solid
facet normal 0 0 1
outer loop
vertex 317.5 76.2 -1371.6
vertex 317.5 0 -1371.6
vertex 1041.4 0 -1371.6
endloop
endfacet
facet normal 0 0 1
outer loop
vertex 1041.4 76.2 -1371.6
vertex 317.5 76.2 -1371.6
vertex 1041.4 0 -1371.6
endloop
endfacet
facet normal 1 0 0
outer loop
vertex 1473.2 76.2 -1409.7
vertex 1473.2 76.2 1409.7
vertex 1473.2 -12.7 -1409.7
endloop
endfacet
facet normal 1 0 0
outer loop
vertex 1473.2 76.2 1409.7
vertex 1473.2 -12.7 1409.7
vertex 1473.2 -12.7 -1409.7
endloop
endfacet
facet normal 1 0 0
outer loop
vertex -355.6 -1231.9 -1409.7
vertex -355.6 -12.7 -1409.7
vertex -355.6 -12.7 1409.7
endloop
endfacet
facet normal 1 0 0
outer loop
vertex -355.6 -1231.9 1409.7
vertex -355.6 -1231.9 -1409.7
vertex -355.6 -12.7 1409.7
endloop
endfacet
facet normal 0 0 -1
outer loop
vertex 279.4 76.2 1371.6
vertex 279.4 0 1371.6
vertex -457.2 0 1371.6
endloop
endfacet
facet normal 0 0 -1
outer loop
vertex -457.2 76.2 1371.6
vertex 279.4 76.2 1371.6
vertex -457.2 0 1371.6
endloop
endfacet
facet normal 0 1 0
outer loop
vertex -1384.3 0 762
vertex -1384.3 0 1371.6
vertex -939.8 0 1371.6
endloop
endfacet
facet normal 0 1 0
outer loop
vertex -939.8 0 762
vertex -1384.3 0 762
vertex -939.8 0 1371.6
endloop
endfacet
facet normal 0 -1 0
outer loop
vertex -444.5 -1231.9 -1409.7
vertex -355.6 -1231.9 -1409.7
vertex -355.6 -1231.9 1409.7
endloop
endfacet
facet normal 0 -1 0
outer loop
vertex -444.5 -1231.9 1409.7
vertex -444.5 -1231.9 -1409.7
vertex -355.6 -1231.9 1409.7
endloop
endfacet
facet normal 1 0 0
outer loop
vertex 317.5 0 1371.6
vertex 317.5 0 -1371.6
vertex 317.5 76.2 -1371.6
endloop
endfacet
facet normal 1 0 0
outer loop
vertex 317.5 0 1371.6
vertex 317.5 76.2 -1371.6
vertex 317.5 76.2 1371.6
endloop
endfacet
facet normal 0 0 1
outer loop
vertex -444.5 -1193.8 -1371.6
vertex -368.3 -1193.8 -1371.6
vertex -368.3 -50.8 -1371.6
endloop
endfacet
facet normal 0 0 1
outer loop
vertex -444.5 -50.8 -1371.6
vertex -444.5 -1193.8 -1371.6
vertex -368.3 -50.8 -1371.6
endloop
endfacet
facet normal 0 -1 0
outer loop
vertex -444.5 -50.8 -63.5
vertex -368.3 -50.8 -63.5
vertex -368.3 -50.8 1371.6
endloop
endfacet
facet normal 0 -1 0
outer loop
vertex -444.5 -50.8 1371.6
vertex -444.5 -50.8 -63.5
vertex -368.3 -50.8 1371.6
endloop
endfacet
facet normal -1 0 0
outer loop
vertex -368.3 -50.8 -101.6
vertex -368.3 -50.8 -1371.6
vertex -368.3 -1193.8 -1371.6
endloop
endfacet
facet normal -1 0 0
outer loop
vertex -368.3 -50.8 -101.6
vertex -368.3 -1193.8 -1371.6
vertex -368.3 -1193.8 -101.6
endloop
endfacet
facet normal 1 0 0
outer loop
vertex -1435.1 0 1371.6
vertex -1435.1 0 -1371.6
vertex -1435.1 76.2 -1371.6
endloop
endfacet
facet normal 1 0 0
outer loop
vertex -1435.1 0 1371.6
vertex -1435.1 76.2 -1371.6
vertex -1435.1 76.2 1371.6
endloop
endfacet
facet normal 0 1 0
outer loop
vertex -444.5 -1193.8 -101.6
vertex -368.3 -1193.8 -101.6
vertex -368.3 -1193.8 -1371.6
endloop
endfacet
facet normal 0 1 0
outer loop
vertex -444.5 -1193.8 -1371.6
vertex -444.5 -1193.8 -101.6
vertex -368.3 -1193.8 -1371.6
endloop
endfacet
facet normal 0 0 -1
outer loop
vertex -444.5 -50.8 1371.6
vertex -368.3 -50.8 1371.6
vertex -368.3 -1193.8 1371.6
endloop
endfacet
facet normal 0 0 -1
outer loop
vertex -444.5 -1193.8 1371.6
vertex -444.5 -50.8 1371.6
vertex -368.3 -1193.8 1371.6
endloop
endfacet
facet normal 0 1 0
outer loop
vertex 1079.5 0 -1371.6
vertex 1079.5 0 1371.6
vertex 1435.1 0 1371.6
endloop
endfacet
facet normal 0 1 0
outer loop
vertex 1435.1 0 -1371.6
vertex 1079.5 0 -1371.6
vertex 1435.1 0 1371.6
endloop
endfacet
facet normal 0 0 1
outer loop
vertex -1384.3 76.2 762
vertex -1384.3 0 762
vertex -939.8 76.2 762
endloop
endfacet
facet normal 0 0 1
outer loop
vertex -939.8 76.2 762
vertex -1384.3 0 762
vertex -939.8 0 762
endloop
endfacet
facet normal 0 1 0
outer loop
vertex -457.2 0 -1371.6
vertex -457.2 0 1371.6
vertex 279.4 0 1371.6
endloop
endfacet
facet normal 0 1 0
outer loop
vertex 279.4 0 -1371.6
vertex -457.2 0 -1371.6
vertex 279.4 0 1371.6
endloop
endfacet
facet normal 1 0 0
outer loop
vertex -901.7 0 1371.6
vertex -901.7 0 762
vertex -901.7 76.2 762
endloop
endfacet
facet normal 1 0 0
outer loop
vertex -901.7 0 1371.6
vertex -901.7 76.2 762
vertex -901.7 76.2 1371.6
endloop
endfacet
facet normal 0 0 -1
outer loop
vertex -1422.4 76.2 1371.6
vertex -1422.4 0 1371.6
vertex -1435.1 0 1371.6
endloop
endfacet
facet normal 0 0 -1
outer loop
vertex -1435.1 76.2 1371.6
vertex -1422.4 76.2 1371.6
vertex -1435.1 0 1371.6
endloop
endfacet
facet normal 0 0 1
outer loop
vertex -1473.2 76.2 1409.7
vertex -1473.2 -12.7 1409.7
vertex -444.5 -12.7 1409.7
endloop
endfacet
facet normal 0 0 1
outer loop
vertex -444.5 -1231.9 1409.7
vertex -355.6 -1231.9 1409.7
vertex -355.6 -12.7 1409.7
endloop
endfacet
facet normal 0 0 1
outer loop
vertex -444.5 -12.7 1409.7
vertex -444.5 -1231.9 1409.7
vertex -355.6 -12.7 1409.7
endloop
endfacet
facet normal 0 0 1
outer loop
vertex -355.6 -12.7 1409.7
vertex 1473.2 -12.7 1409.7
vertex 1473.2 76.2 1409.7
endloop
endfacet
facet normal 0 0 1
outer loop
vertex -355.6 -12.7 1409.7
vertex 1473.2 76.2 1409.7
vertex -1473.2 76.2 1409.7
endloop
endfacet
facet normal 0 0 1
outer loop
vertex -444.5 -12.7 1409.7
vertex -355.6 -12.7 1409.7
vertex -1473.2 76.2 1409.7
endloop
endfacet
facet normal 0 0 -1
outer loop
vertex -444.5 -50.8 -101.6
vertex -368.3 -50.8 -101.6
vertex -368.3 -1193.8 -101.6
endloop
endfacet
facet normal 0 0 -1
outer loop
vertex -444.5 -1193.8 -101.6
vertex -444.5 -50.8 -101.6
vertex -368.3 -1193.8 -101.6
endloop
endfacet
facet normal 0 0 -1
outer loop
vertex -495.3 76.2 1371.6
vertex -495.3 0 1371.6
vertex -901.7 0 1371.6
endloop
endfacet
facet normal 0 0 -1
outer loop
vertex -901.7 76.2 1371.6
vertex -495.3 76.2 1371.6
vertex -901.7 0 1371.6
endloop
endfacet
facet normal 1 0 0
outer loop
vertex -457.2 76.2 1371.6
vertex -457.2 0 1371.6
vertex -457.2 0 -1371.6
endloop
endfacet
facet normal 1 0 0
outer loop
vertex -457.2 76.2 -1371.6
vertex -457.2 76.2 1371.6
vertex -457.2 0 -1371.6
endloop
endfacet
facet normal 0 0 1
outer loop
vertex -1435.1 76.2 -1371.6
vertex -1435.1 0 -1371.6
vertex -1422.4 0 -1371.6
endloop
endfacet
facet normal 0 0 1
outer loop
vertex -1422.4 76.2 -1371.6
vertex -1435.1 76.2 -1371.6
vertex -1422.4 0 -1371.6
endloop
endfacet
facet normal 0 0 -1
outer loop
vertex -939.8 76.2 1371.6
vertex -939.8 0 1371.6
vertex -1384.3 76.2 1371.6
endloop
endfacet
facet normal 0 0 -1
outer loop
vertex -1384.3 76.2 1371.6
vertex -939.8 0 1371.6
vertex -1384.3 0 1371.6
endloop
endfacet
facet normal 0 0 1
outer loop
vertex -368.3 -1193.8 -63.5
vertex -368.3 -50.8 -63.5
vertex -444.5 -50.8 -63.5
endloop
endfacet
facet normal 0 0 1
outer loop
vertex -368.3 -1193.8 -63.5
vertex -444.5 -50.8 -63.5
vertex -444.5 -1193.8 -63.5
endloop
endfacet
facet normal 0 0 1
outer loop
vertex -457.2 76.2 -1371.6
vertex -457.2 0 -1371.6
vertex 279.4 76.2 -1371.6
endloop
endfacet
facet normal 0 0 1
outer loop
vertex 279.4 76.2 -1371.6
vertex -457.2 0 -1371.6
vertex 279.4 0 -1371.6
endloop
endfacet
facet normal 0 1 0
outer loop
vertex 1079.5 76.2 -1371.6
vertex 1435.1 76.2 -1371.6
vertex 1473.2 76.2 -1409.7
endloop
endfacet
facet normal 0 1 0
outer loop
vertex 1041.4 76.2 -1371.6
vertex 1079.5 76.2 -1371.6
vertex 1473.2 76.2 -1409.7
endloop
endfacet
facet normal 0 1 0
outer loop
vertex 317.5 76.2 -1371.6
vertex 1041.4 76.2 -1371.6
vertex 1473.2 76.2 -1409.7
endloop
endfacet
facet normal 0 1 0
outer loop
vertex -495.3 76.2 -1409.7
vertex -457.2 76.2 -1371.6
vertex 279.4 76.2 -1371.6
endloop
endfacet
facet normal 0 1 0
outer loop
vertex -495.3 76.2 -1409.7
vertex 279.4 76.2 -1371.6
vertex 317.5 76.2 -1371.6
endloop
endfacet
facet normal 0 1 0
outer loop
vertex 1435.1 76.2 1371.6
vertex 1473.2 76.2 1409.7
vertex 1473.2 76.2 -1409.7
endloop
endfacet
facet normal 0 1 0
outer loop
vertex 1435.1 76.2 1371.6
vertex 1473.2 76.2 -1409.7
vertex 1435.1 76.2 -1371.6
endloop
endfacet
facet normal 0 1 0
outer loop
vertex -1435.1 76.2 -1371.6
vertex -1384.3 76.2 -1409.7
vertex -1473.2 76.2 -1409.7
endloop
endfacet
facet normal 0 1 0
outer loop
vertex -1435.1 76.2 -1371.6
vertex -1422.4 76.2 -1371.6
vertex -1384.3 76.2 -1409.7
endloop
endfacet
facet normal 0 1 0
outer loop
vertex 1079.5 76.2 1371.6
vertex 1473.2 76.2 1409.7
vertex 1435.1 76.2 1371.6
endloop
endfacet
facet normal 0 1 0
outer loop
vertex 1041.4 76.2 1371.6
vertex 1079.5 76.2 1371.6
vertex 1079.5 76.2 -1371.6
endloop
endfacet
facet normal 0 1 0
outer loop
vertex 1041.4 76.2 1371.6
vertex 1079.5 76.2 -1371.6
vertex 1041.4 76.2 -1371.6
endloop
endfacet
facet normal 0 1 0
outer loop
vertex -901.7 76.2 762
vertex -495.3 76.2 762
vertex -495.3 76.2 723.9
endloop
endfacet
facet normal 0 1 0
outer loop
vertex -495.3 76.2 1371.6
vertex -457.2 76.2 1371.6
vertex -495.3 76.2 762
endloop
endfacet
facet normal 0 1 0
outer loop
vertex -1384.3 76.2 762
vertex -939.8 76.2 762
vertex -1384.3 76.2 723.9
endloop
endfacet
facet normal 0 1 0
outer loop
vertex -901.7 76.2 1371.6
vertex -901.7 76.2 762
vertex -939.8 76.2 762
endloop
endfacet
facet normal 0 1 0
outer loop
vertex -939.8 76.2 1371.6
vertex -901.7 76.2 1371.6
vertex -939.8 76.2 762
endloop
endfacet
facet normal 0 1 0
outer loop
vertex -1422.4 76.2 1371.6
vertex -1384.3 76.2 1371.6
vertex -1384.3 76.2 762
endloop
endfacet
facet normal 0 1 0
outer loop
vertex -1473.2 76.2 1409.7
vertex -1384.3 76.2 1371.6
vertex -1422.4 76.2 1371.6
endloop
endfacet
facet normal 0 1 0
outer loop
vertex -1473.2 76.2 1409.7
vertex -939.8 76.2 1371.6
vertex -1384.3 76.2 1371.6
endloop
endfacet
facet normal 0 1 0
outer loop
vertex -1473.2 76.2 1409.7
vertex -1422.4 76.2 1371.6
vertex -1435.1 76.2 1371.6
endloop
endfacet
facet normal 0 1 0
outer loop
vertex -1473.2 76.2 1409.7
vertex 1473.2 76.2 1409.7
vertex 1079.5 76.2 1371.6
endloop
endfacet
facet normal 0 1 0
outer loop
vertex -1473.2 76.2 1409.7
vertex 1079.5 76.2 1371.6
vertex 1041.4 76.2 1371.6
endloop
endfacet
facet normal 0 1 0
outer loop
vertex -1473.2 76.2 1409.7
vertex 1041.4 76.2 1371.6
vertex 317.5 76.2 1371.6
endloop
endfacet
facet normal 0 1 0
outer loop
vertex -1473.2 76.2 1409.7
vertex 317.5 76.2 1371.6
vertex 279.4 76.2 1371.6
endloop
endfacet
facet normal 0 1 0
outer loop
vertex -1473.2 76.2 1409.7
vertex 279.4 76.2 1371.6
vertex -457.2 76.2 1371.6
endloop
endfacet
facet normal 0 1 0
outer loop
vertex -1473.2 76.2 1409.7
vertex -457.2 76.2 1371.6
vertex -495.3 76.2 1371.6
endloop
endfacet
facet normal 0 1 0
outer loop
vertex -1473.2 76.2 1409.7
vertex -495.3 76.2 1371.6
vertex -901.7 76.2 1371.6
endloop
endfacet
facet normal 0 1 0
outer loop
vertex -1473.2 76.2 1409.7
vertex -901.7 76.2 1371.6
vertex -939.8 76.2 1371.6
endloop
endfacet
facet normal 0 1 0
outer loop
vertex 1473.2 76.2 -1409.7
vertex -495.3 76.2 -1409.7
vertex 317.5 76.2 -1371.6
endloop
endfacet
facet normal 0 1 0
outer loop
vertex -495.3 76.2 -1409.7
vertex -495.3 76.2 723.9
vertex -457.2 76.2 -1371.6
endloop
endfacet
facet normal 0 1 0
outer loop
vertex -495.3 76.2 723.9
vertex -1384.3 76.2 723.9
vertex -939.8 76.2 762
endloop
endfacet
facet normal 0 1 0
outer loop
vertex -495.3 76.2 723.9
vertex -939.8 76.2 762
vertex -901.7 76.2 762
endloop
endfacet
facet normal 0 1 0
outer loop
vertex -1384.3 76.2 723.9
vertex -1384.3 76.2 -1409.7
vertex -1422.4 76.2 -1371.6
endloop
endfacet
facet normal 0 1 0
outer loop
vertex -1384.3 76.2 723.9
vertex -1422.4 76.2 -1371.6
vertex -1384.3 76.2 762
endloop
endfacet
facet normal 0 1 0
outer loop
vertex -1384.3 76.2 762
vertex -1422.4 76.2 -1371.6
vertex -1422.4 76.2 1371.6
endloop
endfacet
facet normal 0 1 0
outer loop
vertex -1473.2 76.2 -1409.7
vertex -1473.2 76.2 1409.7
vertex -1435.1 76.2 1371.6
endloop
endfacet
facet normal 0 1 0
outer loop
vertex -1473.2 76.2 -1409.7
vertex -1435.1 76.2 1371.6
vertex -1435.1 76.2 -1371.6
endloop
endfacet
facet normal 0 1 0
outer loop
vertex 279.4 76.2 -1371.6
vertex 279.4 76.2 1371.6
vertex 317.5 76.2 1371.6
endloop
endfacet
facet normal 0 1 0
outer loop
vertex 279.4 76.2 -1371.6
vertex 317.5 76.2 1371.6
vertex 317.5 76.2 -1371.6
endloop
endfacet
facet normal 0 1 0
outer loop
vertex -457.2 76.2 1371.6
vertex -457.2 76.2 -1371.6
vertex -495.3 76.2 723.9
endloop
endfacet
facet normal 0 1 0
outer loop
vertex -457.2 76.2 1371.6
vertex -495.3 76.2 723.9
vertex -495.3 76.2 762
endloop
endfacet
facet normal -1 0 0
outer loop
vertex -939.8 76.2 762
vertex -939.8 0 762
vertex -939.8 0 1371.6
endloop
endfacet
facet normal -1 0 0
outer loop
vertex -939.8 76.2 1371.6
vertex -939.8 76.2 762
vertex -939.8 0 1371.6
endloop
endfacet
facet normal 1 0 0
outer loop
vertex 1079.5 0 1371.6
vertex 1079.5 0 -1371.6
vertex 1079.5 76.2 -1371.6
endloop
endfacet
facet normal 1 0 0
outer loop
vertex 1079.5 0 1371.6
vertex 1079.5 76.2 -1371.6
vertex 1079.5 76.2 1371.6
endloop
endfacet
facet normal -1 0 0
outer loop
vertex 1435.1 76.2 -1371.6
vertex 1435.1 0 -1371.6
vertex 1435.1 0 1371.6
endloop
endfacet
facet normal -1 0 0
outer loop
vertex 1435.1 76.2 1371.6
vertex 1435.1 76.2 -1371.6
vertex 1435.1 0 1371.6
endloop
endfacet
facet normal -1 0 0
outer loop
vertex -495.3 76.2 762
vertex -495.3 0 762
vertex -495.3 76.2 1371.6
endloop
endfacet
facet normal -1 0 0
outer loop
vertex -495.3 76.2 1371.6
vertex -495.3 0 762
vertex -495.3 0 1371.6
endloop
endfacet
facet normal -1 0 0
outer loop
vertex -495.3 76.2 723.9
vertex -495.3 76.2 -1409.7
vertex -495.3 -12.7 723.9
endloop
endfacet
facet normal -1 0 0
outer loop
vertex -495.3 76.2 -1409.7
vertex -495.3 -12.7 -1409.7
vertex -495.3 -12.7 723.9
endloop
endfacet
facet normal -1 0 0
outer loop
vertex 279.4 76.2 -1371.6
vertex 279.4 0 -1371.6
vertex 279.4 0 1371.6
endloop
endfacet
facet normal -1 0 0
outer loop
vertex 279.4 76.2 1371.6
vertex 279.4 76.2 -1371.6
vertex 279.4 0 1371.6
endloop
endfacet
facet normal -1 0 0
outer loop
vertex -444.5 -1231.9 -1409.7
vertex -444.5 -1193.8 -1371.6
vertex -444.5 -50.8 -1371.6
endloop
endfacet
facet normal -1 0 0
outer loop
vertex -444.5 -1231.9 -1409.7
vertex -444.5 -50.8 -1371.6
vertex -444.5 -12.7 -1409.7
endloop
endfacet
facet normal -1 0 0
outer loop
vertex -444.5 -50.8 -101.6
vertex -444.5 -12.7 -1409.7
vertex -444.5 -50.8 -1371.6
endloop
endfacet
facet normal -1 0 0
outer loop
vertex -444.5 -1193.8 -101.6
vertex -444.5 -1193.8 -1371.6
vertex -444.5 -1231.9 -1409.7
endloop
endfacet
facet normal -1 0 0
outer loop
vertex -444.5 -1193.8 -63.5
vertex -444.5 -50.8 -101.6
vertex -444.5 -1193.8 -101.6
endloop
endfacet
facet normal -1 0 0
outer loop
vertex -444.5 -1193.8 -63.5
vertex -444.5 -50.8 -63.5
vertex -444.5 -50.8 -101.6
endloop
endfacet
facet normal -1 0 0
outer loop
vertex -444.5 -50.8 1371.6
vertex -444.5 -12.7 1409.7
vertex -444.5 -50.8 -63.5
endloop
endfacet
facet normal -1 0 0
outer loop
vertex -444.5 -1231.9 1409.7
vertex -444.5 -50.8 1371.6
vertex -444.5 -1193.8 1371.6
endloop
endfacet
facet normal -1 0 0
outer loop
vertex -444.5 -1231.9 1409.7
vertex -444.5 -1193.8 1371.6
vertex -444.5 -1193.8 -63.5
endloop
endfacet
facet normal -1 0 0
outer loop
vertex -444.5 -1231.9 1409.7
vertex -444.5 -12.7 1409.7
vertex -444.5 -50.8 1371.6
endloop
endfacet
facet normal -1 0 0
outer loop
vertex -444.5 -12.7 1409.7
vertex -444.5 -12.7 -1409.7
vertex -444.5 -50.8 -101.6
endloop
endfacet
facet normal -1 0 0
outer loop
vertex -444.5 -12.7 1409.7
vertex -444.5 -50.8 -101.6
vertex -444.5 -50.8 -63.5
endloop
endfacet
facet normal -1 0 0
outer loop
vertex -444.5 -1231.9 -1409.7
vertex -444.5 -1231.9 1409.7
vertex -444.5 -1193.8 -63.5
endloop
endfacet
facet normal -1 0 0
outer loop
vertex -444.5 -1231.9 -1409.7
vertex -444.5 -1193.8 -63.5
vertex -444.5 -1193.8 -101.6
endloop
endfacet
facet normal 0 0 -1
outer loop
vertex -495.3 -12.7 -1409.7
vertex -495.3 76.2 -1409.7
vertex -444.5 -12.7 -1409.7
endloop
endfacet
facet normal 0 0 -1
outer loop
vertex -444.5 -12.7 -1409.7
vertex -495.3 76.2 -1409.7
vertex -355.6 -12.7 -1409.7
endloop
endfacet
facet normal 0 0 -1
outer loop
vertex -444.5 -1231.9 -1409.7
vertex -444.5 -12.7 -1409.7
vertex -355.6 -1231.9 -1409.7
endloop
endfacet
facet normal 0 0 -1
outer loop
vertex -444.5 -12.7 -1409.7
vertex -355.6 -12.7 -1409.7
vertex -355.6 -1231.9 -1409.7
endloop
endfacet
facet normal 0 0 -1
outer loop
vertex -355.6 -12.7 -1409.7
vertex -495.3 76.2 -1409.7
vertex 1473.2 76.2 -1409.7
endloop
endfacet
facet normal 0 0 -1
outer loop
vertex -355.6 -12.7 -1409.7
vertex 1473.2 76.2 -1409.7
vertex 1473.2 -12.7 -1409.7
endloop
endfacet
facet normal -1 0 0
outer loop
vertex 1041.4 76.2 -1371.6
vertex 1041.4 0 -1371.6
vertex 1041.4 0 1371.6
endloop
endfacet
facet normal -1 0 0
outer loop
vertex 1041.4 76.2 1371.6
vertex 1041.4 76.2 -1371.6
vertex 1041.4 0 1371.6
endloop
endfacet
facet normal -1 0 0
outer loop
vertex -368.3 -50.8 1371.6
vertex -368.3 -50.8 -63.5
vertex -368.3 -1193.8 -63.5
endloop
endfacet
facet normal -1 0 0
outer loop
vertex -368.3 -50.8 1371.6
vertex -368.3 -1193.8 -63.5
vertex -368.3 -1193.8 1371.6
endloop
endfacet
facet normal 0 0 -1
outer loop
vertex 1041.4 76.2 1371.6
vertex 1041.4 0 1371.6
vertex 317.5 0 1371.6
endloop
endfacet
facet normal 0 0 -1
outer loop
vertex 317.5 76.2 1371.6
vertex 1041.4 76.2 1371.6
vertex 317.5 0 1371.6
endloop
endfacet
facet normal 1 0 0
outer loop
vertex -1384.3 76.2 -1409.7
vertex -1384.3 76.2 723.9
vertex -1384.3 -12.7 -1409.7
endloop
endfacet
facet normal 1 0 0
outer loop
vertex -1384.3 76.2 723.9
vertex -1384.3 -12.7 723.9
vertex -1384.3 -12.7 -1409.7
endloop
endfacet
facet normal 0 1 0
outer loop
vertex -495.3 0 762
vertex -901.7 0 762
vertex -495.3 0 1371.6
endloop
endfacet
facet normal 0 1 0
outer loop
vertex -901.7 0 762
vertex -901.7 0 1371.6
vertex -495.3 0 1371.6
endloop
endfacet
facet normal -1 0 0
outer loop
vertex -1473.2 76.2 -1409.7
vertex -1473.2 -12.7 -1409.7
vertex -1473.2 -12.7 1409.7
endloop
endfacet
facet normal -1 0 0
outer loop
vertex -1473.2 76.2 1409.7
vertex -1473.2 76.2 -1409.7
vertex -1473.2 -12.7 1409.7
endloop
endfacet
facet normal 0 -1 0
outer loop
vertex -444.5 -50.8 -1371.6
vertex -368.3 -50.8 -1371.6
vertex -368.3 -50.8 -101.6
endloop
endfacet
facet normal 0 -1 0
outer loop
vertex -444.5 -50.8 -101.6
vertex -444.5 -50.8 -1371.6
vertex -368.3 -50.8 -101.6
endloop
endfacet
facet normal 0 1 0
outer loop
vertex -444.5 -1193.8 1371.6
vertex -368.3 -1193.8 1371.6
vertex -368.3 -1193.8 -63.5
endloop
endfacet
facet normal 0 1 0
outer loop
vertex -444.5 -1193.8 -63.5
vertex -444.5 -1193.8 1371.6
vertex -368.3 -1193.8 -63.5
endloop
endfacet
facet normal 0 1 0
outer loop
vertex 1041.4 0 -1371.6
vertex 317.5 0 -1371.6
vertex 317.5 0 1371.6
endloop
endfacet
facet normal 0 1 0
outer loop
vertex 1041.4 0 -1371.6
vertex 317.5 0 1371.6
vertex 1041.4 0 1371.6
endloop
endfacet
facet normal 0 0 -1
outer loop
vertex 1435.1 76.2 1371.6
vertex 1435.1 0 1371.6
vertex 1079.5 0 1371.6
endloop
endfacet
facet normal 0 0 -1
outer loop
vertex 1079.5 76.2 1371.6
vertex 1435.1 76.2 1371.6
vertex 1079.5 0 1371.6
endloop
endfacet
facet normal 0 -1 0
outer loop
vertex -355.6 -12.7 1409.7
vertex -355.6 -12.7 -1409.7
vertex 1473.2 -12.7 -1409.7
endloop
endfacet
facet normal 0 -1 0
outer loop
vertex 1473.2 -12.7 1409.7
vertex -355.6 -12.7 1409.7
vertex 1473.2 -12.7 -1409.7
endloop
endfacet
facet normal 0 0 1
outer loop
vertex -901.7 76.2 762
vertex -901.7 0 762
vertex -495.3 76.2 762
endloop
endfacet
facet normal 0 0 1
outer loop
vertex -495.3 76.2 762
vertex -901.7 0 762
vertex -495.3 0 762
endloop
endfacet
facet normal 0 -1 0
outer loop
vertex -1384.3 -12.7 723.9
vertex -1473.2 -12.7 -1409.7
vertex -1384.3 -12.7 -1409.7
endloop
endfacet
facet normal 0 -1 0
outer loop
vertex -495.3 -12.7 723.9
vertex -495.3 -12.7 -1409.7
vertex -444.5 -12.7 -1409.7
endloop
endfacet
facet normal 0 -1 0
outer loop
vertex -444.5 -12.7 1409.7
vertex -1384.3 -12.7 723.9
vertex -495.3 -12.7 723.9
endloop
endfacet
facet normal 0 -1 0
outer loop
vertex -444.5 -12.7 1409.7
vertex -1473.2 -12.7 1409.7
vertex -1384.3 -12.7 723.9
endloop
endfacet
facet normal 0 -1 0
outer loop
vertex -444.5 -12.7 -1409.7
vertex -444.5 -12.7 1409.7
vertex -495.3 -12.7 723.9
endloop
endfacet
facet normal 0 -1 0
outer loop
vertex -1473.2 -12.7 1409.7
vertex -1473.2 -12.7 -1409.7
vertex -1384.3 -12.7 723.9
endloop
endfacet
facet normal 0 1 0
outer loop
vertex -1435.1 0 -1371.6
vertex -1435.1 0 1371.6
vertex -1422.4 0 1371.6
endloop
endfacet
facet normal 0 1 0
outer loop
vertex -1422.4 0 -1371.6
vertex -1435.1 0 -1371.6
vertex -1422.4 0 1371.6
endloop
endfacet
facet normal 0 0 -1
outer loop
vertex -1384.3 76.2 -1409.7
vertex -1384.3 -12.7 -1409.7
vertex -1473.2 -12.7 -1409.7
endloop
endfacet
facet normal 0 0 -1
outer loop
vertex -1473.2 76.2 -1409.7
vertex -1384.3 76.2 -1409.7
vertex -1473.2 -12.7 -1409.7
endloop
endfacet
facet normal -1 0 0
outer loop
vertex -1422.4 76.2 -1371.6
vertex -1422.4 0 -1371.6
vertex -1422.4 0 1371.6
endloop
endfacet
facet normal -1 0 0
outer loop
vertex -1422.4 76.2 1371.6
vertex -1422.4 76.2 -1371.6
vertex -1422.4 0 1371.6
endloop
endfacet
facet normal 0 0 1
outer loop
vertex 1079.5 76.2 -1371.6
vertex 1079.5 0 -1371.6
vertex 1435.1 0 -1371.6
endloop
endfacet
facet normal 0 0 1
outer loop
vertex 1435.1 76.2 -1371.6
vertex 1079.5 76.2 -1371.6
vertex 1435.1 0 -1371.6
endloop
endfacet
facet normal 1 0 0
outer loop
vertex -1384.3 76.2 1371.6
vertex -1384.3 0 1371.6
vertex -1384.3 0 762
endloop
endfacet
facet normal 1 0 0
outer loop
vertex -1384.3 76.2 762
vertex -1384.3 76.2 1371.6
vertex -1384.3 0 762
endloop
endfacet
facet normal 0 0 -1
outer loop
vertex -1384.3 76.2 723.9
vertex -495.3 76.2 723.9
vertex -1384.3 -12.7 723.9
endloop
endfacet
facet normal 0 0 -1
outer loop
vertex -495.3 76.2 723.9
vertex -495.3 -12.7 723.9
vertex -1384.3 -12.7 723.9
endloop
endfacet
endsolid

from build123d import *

# Parameters (mm, degrees)
F1_DEPTH = 12.7
F2_W     = 38.1
F2_H     = 2743.2
F2_H_2   = 609.6
F3_DEPTH = 76.2
F4_W     = 12.7
F4_H     = 2819.4
F5_DEPTH = 1219.2
F6_W     = 1143
F6_H     = 38.1
F7_DEPTH = 76.2


with BuildPart() as f1:
    # F0 (on Front) → F1 (new body)
    with BuildSketch(Plane.XZ):
        Polygon((1473.2, -1409.7), (1473.2, 1409.7), (-1473.2, 1409.7), (-1473.2, -1409.7), (-1384.3, -1409.7), (-1384.3, 723.9), (-495.3, 723.9), (-495.3, -1409.7), align=None)
    extrude(amount=F1_DEPTH)

    # F2 (on face) → F3 (join)
    with BuildSketch(Plane(origin=(0, 0, 0), x_dir=(-1, 0, 0), z_dir=(0, 1, 0))):
        Polygon((1473.2, 1409.7), (-1473.2, 1409.7), (-1473.2, 1371.6), (-1435.1, 1371.6), (-1079.5, 1371.6), (-1041.4, 1371.6), (-317.5, 1371.6), (-279.4, 1371.6), (457.2, 1371.6), (495.3, 1371.6), (901.7, 1371.6), (939.8, 1371.6), (1041.4, 1371.6), (1079.5, 1371.6), (1384.3, 1371.6), (1422.4, 1371.6), (1435.1, 1371.6), (1473.2, 1371.6), align=None)
        with Locations((-1454.15, 0)):
            Rectangle(F2_W, F2_H)
        with Locations((1454.15, 0)):
            Rectangle(F2_W, F2_H)
        Polygon((-1435.1, -1371.6), (-1473.2, -1371.6), (-1473.2, -1409.7), (495.3, -1409.7), (495.3, -1371.6), (457.2, -1371.6), (-279.4, -1371.6), (-317.5, -1371.6), (-1041.4, -1371.6), (-1079.5, -1371.6), align=None)
        Polygon((1473.2, -1409.7), (1473.2, -1371.6), (1435.1, -1371.6), (1422.4, -1371.6), (1384.3, -1371.6), (1384.3, -1409.7), align=None)
        Polygon((1422.4, -1371.6), (1422.4, 1371.6), (1384.3, 1371.6), (1384.3, 762), (1384.3, 723.9), (1384.3, -1371.6), align=None)
        Polygon((457.2, -1371.6), (495.3, -1371.6), (495.3, 723.9), (495.3, 762), (495.3, 1371.6), (457.2, 1371.6), align=None)
        Polygon((1384.3, 723.9), (1384.3, 762), (939.8, 762), (901.7, 762), (495.3, 762), (495.3, 723.9), align=None)
        with Locations((-1060.45, 0)):
            Rectangle(F2_W, F2_H)
        with Locations((-298.45, 0)):
            Rectangle(F2_W, F2_H)
        with Locations((920.75, 1066.8)):
            Rectangle(F2_W, F2_H_2)
    extrude(amount=F3_DEPTH)

    # F4 (on face) → F5 (join)
    with BuildSketch(Plane.XZ.offset(12.7)):
        with Locations((-361.95, 0)):
            Rectangle(F4_W, F4_H)
    extrude(amount=F5_DEPTH)

    # F6 (on face) → F7 (join)
    with BuildSketch(Plane(origin=(-368.3, 0, 0), x_dir=(0, -1, 0), z_dir=(-1, 0, 0))):
        Polygon((1231.9, 1371.6), (1231.9, 1409.7), (12.7, 1409.7), (12.7, 1371.6), (50.8, 1371.6), (1193.8, 1371.6), align=None)
        Polygon((1231.9, -1409.7), (1231.9, 1371.6), (1193.8, 1371.6), (1193.8, -63.5), (1193.8, -101.6), (1193.8, -1371.6), (1193.8, -1409.7), align=None)
        Polygon((50.8, 1371.6), (12.7, 1371.6), (12.7, -1371.6), (50.8, -1371.6), (50.8, -101.6), (50.8, -63.5), align=None)
        Polygon((50.8, -1371.6), (12.7, -1371.6), (12.7, -1409.7), (1193.8, -1409.7), (1193.8, -1371.6), align=None)
        with Locations((622.3, -82.55)):
            Rectangle(F6_W, F6_H)
    extrude(amount=F7_DEPTH)


solid = f1.part
